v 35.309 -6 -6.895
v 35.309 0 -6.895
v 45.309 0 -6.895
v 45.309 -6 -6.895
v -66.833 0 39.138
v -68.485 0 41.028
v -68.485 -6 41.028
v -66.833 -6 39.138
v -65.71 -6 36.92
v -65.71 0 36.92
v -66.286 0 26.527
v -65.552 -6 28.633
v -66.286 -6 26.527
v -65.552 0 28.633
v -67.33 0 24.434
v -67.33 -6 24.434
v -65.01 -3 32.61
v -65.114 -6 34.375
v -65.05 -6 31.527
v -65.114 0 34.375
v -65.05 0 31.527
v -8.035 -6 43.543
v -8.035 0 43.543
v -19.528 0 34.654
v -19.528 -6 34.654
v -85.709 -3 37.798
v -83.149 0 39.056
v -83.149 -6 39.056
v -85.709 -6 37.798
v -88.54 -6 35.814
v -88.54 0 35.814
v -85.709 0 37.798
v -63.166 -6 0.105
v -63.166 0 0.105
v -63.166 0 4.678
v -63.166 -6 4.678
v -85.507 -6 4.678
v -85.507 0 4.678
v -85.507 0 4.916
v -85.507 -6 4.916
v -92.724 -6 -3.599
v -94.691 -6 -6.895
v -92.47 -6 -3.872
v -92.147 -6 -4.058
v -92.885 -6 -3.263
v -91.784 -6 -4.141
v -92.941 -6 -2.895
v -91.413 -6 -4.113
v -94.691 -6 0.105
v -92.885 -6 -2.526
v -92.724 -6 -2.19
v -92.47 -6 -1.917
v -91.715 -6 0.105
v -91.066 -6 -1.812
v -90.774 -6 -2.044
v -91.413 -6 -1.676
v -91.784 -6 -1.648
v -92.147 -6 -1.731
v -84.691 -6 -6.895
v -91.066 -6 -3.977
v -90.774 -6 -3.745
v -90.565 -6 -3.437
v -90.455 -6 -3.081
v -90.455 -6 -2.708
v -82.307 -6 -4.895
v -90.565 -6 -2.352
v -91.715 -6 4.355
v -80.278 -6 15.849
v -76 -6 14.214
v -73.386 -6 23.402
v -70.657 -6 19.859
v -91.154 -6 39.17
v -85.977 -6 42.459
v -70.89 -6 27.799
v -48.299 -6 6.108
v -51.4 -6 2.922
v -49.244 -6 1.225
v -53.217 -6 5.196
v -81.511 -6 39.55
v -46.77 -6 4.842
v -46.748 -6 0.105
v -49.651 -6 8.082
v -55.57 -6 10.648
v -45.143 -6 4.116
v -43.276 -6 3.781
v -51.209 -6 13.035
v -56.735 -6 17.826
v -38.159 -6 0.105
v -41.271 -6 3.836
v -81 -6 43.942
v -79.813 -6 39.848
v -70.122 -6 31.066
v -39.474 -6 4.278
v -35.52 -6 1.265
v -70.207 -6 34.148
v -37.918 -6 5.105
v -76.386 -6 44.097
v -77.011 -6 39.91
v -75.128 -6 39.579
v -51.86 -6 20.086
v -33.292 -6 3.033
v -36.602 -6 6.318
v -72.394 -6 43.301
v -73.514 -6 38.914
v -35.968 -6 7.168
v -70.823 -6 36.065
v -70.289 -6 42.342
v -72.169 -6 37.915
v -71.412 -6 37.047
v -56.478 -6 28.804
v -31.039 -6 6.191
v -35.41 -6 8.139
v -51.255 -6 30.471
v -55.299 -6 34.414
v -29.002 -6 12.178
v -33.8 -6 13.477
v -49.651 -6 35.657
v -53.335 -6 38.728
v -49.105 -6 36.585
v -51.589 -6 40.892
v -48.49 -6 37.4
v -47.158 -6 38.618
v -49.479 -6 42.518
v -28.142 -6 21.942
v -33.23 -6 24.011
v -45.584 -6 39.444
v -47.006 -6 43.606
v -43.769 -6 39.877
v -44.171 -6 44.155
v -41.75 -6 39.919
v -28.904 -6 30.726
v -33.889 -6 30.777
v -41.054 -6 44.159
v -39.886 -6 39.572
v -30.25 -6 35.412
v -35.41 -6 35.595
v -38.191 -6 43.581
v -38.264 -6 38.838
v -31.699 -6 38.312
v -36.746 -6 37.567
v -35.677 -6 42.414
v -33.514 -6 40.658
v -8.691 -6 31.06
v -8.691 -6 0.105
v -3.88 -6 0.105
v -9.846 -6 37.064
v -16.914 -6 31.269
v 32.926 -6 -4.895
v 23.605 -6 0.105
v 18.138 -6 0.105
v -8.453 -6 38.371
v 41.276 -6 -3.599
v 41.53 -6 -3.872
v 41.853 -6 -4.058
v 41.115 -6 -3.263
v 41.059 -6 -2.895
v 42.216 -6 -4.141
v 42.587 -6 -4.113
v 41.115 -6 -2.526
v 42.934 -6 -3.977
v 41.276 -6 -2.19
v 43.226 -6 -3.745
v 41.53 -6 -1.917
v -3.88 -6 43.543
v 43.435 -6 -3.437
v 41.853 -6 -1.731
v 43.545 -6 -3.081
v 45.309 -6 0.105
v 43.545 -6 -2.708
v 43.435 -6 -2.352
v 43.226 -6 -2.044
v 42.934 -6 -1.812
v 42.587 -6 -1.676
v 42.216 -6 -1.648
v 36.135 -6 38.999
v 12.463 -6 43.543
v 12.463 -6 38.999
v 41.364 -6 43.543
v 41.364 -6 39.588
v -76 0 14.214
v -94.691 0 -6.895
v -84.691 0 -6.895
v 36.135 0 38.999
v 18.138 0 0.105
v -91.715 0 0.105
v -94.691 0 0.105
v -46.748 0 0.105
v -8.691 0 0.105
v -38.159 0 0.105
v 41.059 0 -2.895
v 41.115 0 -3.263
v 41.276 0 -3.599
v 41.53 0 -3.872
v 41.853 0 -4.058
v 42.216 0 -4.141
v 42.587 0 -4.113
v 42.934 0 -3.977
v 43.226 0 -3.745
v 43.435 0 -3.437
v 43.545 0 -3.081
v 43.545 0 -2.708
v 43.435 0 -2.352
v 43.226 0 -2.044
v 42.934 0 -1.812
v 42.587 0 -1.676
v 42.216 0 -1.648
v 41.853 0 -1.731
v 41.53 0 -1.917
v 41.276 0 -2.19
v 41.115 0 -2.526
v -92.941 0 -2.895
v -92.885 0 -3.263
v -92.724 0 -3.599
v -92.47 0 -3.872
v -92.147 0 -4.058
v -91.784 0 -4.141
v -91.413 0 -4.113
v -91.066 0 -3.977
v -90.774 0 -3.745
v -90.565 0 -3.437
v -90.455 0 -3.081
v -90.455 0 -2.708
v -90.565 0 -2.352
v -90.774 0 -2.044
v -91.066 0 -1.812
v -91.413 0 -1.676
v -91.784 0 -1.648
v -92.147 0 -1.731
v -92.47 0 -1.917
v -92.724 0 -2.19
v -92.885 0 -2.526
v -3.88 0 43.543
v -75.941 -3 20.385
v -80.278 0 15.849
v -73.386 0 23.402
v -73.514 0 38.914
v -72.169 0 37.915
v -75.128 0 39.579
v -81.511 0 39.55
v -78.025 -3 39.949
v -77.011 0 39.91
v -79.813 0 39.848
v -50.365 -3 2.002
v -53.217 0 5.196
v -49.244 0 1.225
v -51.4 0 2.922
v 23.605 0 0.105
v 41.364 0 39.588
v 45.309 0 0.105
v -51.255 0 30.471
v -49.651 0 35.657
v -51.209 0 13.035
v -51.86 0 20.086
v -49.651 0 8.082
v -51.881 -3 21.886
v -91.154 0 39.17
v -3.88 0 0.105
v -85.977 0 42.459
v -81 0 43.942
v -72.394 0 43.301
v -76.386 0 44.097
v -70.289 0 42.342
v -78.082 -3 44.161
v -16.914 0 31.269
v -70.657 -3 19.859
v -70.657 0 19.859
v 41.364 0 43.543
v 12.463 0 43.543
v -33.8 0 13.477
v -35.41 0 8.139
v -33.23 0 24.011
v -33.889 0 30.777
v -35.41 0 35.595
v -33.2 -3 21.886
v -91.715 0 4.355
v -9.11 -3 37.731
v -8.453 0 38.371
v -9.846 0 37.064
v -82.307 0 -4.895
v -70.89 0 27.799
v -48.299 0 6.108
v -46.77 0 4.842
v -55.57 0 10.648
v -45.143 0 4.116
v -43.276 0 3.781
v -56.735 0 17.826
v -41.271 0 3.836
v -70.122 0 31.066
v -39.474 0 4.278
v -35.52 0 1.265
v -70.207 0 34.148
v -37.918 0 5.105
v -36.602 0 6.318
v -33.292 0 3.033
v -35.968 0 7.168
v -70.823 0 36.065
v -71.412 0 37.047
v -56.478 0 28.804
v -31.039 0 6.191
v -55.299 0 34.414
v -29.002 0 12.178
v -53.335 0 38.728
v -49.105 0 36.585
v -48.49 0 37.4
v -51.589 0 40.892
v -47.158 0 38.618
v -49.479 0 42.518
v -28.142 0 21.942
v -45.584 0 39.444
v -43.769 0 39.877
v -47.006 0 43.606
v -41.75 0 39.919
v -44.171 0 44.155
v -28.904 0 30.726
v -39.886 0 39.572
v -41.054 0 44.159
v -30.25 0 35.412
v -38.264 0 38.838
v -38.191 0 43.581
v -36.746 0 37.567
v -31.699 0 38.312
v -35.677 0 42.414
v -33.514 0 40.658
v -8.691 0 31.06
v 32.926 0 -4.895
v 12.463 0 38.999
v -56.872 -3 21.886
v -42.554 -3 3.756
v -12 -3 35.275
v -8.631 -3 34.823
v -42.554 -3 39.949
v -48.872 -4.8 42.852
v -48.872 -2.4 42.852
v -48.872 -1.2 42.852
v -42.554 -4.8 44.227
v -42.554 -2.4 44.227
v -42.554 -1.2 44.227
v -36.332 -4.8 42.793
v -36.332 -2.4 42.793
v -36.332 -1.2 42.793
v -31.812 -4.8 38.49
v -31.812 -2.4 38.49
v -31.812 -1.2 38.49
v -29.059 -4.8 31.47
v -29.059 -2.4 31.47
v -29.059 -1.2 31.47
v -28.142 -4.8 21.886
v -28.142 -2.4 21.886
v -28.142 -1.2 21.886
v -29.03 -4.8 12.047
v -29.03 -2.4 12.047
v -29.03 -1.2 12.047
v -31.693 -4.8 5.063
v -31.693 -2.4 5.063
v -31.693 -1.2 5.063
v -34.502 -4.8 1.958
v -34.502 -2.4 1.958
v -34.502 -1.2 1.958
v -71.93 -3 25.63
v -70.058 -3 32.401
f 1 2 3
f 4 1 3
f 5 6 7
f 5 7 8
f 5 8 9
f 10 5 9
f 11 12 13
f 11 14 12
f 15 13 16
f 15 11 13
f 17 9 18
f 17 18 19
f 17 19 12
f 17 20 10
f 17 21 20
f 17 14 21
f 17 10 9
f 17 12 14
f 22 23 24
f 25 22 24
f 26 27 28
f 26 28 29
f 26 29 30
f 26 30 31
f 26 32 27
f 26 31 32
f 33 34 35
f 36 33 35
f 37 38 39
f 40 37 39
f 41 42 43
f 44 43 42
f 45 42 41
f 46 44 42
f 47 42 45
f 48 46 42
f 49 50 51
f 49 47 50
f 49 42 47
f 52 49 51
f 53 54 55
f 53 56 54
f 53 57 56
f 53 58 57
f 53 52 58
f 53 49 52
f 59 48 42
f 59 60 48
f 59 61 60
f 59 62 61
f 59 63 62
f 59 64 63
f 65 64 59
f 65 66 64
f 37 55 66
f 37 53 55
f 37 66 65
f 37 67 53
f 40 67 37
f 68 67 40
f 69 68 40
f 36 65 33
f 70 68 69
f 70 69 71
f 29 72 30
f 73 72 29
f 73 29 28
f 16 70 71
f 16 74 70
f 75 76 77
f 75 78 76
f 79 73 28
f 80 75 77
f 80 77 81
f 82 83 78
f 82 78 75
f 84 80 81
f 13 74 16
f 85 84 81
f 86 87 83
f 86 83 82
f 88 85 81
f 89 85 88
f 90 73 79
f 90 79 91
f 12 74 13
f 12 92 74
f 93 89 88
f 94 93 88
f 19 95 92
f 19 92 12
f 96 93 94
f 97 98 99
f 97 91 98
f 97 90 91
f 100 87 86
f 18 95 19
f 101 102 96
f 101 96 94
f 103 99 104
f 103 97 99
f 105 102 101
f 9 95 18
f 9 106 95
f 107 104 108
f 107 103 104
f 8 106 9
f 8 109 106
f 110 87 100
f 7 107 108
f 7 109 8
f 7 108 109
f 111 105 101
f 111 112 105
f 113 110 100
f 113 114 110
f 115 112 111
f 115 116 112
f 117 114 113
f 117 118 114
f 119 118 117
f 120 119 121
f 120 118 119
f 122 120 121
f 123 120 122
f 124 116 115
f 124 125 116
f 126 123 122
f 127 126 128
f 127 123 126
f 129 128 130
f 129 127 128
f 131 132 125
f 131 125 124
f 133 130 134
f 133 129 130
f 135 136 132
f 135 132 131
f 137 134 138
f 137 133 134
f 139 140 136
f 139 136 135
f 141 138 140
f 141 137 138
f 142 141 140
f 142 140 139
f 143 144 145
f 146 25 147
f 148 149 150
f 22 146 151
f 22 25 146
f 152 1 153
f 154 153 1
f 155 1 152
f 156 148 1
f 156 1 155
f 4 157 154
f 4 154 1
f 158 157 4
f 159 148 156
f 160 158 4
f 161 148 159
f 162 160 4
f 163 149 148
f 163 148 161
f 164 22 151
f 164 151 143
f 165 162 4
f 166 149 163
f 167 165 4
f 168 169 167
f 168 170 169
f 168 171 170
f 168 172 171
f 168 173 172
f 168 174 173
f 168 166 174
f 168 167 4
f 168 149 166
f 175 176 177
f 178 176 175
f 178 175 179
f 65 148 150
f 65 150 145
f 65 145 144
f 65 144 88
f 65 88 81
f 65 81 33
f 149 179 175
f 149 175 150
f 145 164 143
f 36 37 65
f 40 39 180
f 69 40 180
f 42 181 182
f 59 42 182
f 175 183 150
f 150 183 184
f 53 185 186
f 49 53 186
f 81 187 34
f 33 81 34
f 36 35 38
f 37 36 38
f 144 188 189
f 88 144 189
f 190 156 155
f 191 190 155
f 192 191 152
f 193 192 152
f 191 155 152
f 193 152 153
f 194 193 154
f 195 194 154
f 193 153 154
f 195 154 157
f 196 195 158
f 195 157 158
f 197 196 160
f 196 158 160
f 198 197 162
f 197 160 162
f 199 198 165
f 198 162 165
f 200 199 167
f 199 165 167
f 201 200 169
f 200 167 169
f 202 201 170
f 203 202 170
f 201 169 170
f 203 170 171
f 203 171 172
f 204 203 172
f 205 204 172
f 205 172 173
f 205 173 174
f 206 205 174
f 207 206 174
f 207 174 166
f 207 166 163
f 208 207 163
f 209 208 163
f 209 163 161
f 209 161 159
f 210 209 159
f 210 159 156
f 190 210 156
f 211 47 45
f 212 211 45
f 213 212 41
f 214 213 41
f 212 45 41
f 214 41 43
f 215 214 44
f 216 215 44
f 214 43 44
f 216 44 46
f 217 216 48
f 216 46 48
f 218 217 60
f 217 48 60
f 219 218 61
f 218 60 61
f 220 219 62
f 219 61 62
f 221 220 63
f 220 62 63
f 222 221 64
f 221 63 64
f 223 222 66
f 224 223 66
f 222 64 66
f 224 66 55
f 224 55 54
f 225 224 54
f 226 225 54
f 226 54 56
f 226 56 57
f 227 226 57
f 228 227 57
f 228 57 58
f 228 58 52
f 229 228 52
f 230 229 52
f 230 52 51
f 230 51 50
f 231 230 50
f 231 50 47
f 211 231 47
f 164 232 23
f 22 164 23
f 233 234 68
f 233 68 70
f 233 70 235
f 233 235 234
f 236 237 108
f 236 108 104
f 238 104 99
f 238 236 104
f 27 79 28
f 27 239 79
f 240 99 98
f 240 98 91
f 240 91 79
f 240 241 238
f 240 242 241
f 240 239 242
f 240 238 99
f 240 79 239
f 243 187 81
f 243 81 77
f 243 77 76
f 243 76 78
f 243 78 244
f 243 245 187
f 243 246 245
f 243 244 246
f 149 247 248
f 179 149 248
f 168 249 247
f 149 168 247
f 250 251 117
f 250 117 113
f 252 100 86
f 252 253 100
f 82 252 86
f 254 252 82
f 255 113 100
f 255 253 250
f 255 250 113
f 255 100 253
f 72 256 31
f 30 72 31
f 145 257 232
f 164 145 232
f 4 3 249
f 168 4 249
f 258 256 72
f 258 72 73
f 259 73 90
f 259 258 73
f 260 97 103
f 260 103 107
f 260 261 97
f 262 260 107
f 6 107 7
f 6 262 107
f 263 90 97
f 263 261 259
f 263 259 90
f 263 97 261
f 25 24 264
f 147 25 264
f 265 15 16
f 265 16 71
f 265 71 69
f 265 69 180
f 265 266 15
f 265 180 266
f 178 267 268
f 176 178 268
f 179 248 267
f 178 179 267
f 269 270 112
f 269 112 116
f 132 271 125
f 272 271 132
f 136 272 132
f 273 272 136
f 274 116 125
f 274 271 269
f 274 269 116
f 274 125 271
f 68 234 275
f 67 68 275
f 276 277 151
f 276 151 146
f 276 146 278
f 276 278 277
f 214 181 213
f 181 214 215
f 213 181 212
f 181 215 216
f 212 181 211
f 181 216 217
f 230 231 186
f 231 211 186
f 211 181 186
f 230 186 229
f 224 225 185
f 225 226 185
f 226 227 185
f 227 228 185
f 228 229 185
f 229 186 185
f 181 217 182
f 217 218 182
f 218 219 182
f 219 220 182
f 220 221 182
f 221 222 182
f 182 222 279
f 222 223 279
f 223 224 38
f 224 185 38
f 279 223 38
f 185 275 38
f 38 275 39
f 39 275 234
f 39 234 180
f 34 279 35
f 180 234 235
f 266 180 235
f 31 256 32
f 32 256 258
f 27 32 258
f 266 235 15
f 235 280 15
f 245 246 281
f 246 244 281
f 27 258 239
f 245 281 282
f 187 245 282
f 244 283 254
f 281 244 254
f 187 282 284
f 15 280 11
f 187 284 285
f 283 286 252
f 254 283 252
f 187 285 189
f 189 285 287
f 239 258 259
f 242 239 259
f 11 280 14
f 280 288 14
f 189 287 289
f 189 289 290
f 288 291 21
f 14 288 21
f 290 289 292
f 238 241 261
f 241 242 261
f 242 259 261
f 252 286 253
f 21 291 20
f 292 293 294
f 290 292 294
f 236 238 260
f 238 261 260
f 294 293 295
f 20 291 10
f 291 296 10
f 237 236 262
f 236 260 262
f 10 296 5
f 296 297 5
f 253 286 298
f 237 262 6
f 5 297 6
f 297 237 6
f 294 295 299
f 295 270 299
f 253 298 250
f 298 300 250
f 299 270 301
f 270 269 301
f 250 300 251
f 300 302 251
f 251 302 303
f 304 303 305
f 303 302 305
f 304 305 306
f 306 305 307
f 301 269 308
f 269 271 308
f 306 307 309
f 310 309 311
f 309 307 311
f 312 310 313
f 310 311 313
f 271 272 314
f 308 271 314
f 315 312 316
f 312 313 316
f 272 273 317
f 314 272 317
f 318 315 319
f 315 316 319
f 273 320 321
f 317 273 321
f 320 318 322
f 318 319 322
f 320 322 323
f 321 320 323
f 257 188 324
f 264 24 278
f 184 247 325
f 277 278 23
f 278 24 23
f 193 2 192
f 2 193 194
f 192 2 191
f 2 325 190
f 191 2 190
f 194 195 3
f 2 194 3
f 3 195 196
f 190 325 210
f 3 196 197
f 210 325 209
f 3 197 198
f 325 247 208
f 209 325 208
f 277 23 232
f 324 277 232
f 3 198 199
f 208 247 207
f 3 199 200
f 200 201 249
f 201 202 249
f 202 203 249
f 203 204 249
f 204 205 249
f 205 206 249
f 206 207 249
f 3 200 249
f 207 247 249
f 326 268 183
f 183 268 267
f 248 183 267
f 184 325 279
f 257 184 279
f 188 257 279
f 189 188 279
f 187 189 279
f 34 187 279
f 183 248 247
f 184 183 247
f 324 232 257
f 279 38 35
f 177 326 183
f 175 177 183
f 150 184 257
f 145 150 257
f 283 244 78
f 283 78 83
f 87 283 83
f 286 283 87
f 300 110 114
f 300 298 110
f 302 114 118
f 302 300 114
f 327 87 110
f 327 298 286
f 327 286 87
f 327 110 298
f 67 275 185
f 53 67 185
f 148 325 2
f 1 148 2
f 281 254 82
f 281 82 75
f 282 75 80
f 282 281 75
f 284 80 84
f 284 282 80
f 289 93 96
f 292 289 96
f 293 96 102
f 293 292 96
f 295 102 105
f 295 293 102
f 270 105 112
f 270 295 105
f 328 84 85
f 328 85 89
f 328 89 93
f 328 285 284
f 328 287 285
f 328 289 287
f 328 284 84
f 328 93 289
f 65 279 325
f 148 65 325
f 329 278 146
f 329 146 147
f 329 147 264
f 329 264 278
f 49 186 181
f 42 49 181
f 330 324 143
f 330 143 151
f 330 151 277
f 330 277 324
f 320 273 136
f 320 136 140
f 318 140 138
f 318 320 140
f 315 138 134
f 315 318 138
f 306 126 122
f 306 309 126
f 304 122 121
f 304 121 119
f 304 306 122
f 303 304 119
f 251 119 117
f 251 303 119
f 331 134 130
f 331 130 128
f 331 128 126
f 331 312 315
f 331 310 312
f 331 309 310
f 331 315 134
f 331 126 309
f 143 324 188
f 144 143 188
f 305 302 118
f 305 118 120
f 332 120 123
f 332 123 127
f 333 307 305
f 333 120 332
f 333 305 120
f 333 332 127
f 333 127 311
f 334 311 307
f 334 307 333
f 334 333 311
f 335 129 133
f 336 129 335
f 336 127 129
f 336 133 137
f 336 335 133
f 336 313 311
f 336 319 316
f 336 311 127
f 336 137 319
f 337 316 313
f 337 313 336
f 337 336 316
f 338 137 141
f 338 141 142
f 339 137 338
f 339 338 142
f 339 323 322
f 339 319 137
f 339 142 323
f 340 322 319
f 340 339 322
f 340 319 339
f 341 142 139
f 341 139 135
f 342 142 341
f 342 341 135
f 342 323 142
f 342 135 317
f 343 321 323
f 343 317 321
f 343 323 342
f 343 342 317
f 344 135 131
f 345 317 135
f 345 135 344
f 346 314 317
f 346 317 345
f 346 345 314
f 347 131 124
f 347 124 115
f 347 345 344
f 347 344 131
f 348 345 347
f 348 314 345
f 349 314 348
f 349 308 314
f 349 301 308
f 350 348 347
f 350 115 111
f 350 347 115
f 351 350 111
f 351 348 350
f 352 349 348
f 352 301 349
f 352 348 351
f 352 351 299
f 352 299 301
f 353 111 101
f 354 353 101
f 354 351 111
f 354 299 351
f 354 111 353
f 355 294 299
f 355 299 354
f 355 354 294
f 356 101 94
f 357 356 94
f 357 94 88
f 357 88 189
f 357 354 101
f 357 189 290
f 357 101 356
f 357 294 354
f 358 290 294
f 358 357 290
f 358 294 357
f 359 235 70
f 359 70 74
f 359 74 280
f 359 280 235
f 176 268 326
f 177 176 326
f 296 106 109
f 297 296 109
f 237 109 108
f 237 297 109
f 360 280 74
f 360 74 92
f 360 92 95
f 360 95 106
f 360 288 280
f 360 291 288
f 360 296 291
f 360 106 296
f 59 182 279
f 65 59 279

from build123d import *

# Parameters (mm, degrees)
F1_DEPTH = 6
F2_D     = 2.5


with BuildPart() as f1:
    # F0 (on Front) → F1 (new body)
    with BuildSketch(Plane.XZ):
        with BuildLine():
            Line((-91.7150999423, 0.1053942247), (-94.6907891994, 0.1053942247))
            Line((-94.6907891994, 0.1053942247), (-94.6907891994, -6.8946057753))
            Line((-94.6907891994, -6.8946057753), (-84.6907891994, -6.8946057753))
            Line((-84.6907891994, -6.8946057753), (-82.3072820142, -4.8946057753))
            Line((-82.3072820142, -4.8946057753), (32.9257036154, -4.8946057753))
            Line((32.9257036154, -4.8946057753), (35.3092108006, -6.8946057753))
            Line((35.3092108006, -6.8946057753), (45.3092108006, -6.8946057753))
            Line((45.3092108006, -6.8946057753), (45.3092108006, 0.1053942247))
            Line((45.3092108006, 0.1053942247), (23.6047425132, 0.1053942247))
            Line((23.6047425132, 0.1053942247), (18.138220715, 0.1053942247))
            Line((18.138220715, 0.1053942247), (-3.8799783886, 0.1053942247))
            Line((-3.8799783886, 0.1053942247), (-8.690517571, 0.1053942247))
            Line((-8.690517571, 0.1053942247), (-38.1593011314, 0.1053942247))
            add(Edge.make_bspline(
                [(-38.1593011314, 0.1053942247), (-40.154230825, -0.4935464245), (-42.5544317364, -0.4935464245)],
                knots=[0.6716946069, 0.6716946069, 0.6716946069, 1, 1, 1], degree=2))
            add(Edge.make_bspline(
                [(-42.5544317364, -0.4935464245), (-44.8276907657, -0.4935464245), (-46.7481902647, 0.1053942247)],
                knots=[0, 0, 0, 0.3244428423, 0.3244428423, 0.3244428423], degree=2))
            Line((-46.7481902647, 0.1053942247), (-63.1655956642, 0.1053942247))
            Line((-63.1655956642, 0.1053942247), (-91.7150999423, 0.1053942247))
        make_face()
        with BuildLine():
            add(Edge.make_bspline(
                [(-46.7481902647, 0.1053942247), (-50.7470677679, 1.3525126379), (-53.2165259915, 5.1963897429)],
                knots=[0.3244428423, 0.3244428423, 0.3244428423, 1, 1, 1], degree=2))
            Line((-46.7481902647, 0.1053942247), (-38.1593011314, 0.1053942247))
            add(Edge.make_bspline(
                [(-31.6926905983, 5.0632918208), (-34.0777857358, 1.33079354), (-38.1593011314, 0.1053942247)],
                knots=[0, 0, 0, 0.6716946069, 0.6716946069, 0.6716946069], degree=2))
            add(Edge.make_bspline(
                [(-28.1418281781, 21.8859184676), (-28.1418281781, 10.6201300661), (-31.6926905983, 5.0632918208)],
                knots=[0, 0, 0, 1, 1, 1], degree=2))
            add(Edge.make_bspline(
                [(-31.8115280287, 38.4898842424), (-28.1418281781, 32.7524131029), (-28.1418281781, 21.8859184676)],
                knots=[0, 0, 0, 1, 1, 1], degree=2))
            add(Edge.make_bspline(
                [(-42.5544317364, 44.2273553819), (-35.4812278793, 44.2273553819), (-31.8115280287, 38.4898842424)],
                knots=[0, 0, 0, 1, 1, 1], degree=2))
            add(Edge.make_bspline(
                [(-53.3353634219, 38.7275591032), (-49.7987614933, 44.2273553819), (-42.5544317364, 44.2273553819)],
                knots=[0, 0, 0, 1, 1, 1], degree=2))
            add(Edge.make_bspline(
                [(-56.8719653504, 21.8859184676), (-56.8719653504, 33.2277628245), (-53.3353634219, 38.7275591032)],
                knots=[0, 0, 0, 1, 1, 1], degree=2))
            add(Edge.make_bspline(
                [(-53.2165259915, 5.1963897429), (-56.8719653504, 10.8863259102), (-56.8719653504, 21.8859184676)],
                knots=[0, 0, 0, 1, 1, 1], degree=2))
        make_face()
        with BuildLine():
            add(Edge.make_bspline(
                [(-51.8807932738, 21.8859184676), (-51.8807932738, 12.4074450192), (-49.6514030796, 8.0817625529)],
                knots=[0, 0, 0, 1, 1, 1], degree=2))
            add(Edge.make_bspline(
                [(-49.6514030796, 35.6567999018), (-51.8807932738, 31.3643919159), (-51.8807932738, 21.8859184676)],
                knots=[0, 0, 0, 1, 1, 1], degree=2))
            add(Edge.make_bspline(
                [(-42.5544317364, 39.9492078876), (-47.4220128854, 39.9492078876), (-49.6514030796, 35.6567999018)],
                knots=[0, 0, 0, 1, 1, 1], degree=2))
            add(Edge.make_bspline(
                [(-35.4099254211, 35.595004438), (-37.6203016264, 39.9492078876), (-42.5544317364, 39.9492078876)],
                knots=[0, 0, 0, 1, 1, 1], degree=2))
            add(Edge.make_bspline(
                [(-33.1995492157, 21.8859184676), (-33.1995492157, 31.2408009883), (-35.4099254211, 35.595004438)],
                knots=[0, 0, 0, 1, 1, 1], degree=2))
            add(Edge.make_bspline(
                [(-35.4099254211, 8.1388045194), (-33.1995492157, 12.5215289524), (-33.1995492157, 21.8859184676)],
                knots=[0, 0, 0, 1, 1, 1], degree=2))
            add(Edge.make_bspline(
                [(-42.5544317364, 3.7560800865), (-37.6203016264, 3.7560800865), (-35.4099254211, 8.1388045194)],
                knots=[0, 0, 0, 1, 1, 1], degree=2))
            add(Edge.make_bspline(
                [(-49.6514030796, 8.0817625529), (-47.4220128854, 3.7560800865), (-42.5544317364, 3.7560800865)],
                knots=[0, 0, 0, 1, 1, 1], degree=2))
        make_face(mode=Mode.SUBTRACT)
        with BuildLine():
            Line((-91.7150999423, 4.3550207357), (-91.7150999423, 0.1053942247))
            Line((-91.7150999423, 0.1053942247), (-63.1655956642, 0.1053942247))
            Line((-63.1655956642, 0.1053942247), (-63.1655956642, 4.6782585463))
            Line((-63.1655956642, 4.6782585463), (-85.5070325785, 4.6782585463))
            Line((-85.5070325785, 4.6782585463), (-85.5070325785, 4.9159334071))
            Line((-85.5070325785, 4.9159334071), (-76.0000381468, 14.2137739612))
            add(Edge.make_bspline(
                [(-67.3296592252, 24.4337929752), (-69.6493658665, 20.3933203418), (-76.0000381468, 14.2137739612)],
                knots=[0, 0, 0, 1, 1, 1], degree=2))
            add(Edge.make_bspline(
                [(-65.0099525839, 32.6098081864), (-65.0099525839, 28.4742656087), (-67.3296592252, 24.4337929752)],
                knots=[0, 0, 0, 1, 1, 1], degree=2))
            add(Edge.make_bspline(
                [(-68.4847590487, 41.0282517556), (-65.0099525839, 37.8956970904), (-65.0099525839, 32.6098081864)],
                knots=[0, 0, 0, 1, 1, 1], degree=2))
            add(Edge.make_bspline(
                [(-78.0820699274, 44.1608064208), (-71.9595655134, 44.1608064208), (-68.4847590487, 41.0282517556)],
                knots=[0, 0, 0, 1, 1, 1], degree=2))
            add(Edge.make_bspline(
                [(-91.1541872708, 39.1696343442), (-85.1552737845, 44.1608064208), (-78.0820699274, 44.1608064208)],
                knots=[0, 0, 0, 1, 1, 1], degree=2))
            Line((-91.1541872708, 39.1696343442), (-88.5397638022, 35.8136653099))
            add(Edge.make_bspline(
                [(-83.1492979594, 39.0555504111), (-85.5735815395, 38.1618929345), (-88.5397638022, 35.8136653099)],
                knots=[0, 0, 0, 1, 1, 1], degree=2))
            add(Edge.make_bspline(
                [(-78.0250279608, 39.9492078876), (-80.7250143794, 39.9492078876), (-83.1492979594, 39.0555504111)],
                knots=[0, 0, 0, 1, 1, 1], degree=2))
            add(Edge.make_bspline(
                [(-72.1687193909, 37.9147110793), (-74.2792721547, 39.9492078876), (-78.0250279608, 39.9492078876)],
                knots=[0, 0, 0, 1, 1, 1], degree=2))
            add(Edge.make_bspline(
                [(-70.0581666271, 32.4006543089), (-70.0581666271, 35.8802142709), (-72.1687193909, 37.9147110793)],
                knots=[0, 0, 0, 1, 1, 1], degree=2))
            add(Edge.make_bspline(
                [(-70.8900286399, 27.799269004), (-70.0581666271, 29.9383427511), (-70.0581666271, 32.4006543089)],
                knots=[0, 0, 0, 1, 1, 1], degree=2))
            add(Edge.make_bspline(
                [(-73.3856146782, 23.4022840794), (-71.7218906526, 25.6601952569), (-70.8900286399, 27.799269004)],
                knots=[0, 0, 0, 1, 1, 1], degree=2))
            add(Edge.make_bspline(
                [(-80.2781856411, 15.8489770035), (-75.0493387037, 21.1443729019), (-73.3856146782, 23.4022840794)],
                knots=[0, 0, 0, 1, 1, 1], degree=2))
            Line((-80.2781856411, 15.8489770035), (-91.7150999423, 4.3550207357))
        make_face()
        with BuildLine():
            Line((-8.690517571, 31.0601680941), (-8.690517571, 0.1053942247))
            Line((-8.690517571, 0.1053942247), (-3.8799783886, 0.1053942247))
            Line((-3.8799783886, 0.1053942247), (-3.8799783886, 43.5428517828))
            Line((-3.8799783886, 43.5428517828), (-8.0345349552, 43.5428517828))
            Line((-8.0345349552, 43.5428517828), (-19.528491223, 34.6538119892))
            Line((-19.528491223, 34.6538119892), (-16.9140677543, 31.2693219716))
            add(Edge.make_bspline(
                [(-9.8456173944, 37.0638350776), (-10.6204374406, 36.3840849758), (-16.9140677543, 31.2693219716)],
                knots=[0, 0, 0, 1, 1, 1], degree=2))
            add(Edge.make_bspline(
                [(-8.4528427102, 38.371046812), (-9.0707973483, 37.7435851795), (-9.8456173944, 37.0638350776)],
                knots=[0, 0, 0, 1, 1, 1], degree=2))
            add(Edge.make_bspline(
                [(-8.690517571, 31.0601680941), (-8.690517571, 34.9295148277), (-8.4528427102, 38.371046812)],
                knots=[0, 0, 0, 1, 1, 1], degree=2))
        make_face()
        Polygon((36.1349611741, 38.9985084445), (18.138220715, 0.1053942247), (23.6047425132, 0.1053942247), (41.3638081115, 39.5879420992), (41.3638081115, 43.5428517828), (12.4625450394, 43.5428517828), (12.4625450394, 38.9985084445), align=None)
        with BuildLine():
            Line((-38.1593011314, 0.1053942247), (-46.7481902647, 0.1053942247))
            add(Edge.make_bspline(
                [(-42.5544317364, -0.4935464245), (-44.8276907657, -0.4935464245), (-46.7481902647, 0.1053942247)],
                knots=[0, 0, 0, 0.3244428423, 0.3244428423, 0.3244428423], degree=2))
            add(Edge.make_bspline(
                [(-38.1593011314, 0.1053942247), (-40.154230825, -0.4935464245), (-42.5544317364, -0.4935464245)],
                knots=[0.6716946069, 0.6716946069, 0.6716946069, 1, 1, 1], degree=2))
        make_face()
    extrude(amount=F1_DEPTH)

    # F2 (through all)
    with Locations(Plane(origin=(0, 0, 0), x_dir=(1, 0, 0), z_dir=(0, 1, 0))):
        with Locations((-91.6907891994, 2.8946057753), (42.3092108006, 2.8946057753)):
            Hole(F2_D / 2)


solid = f1.part
